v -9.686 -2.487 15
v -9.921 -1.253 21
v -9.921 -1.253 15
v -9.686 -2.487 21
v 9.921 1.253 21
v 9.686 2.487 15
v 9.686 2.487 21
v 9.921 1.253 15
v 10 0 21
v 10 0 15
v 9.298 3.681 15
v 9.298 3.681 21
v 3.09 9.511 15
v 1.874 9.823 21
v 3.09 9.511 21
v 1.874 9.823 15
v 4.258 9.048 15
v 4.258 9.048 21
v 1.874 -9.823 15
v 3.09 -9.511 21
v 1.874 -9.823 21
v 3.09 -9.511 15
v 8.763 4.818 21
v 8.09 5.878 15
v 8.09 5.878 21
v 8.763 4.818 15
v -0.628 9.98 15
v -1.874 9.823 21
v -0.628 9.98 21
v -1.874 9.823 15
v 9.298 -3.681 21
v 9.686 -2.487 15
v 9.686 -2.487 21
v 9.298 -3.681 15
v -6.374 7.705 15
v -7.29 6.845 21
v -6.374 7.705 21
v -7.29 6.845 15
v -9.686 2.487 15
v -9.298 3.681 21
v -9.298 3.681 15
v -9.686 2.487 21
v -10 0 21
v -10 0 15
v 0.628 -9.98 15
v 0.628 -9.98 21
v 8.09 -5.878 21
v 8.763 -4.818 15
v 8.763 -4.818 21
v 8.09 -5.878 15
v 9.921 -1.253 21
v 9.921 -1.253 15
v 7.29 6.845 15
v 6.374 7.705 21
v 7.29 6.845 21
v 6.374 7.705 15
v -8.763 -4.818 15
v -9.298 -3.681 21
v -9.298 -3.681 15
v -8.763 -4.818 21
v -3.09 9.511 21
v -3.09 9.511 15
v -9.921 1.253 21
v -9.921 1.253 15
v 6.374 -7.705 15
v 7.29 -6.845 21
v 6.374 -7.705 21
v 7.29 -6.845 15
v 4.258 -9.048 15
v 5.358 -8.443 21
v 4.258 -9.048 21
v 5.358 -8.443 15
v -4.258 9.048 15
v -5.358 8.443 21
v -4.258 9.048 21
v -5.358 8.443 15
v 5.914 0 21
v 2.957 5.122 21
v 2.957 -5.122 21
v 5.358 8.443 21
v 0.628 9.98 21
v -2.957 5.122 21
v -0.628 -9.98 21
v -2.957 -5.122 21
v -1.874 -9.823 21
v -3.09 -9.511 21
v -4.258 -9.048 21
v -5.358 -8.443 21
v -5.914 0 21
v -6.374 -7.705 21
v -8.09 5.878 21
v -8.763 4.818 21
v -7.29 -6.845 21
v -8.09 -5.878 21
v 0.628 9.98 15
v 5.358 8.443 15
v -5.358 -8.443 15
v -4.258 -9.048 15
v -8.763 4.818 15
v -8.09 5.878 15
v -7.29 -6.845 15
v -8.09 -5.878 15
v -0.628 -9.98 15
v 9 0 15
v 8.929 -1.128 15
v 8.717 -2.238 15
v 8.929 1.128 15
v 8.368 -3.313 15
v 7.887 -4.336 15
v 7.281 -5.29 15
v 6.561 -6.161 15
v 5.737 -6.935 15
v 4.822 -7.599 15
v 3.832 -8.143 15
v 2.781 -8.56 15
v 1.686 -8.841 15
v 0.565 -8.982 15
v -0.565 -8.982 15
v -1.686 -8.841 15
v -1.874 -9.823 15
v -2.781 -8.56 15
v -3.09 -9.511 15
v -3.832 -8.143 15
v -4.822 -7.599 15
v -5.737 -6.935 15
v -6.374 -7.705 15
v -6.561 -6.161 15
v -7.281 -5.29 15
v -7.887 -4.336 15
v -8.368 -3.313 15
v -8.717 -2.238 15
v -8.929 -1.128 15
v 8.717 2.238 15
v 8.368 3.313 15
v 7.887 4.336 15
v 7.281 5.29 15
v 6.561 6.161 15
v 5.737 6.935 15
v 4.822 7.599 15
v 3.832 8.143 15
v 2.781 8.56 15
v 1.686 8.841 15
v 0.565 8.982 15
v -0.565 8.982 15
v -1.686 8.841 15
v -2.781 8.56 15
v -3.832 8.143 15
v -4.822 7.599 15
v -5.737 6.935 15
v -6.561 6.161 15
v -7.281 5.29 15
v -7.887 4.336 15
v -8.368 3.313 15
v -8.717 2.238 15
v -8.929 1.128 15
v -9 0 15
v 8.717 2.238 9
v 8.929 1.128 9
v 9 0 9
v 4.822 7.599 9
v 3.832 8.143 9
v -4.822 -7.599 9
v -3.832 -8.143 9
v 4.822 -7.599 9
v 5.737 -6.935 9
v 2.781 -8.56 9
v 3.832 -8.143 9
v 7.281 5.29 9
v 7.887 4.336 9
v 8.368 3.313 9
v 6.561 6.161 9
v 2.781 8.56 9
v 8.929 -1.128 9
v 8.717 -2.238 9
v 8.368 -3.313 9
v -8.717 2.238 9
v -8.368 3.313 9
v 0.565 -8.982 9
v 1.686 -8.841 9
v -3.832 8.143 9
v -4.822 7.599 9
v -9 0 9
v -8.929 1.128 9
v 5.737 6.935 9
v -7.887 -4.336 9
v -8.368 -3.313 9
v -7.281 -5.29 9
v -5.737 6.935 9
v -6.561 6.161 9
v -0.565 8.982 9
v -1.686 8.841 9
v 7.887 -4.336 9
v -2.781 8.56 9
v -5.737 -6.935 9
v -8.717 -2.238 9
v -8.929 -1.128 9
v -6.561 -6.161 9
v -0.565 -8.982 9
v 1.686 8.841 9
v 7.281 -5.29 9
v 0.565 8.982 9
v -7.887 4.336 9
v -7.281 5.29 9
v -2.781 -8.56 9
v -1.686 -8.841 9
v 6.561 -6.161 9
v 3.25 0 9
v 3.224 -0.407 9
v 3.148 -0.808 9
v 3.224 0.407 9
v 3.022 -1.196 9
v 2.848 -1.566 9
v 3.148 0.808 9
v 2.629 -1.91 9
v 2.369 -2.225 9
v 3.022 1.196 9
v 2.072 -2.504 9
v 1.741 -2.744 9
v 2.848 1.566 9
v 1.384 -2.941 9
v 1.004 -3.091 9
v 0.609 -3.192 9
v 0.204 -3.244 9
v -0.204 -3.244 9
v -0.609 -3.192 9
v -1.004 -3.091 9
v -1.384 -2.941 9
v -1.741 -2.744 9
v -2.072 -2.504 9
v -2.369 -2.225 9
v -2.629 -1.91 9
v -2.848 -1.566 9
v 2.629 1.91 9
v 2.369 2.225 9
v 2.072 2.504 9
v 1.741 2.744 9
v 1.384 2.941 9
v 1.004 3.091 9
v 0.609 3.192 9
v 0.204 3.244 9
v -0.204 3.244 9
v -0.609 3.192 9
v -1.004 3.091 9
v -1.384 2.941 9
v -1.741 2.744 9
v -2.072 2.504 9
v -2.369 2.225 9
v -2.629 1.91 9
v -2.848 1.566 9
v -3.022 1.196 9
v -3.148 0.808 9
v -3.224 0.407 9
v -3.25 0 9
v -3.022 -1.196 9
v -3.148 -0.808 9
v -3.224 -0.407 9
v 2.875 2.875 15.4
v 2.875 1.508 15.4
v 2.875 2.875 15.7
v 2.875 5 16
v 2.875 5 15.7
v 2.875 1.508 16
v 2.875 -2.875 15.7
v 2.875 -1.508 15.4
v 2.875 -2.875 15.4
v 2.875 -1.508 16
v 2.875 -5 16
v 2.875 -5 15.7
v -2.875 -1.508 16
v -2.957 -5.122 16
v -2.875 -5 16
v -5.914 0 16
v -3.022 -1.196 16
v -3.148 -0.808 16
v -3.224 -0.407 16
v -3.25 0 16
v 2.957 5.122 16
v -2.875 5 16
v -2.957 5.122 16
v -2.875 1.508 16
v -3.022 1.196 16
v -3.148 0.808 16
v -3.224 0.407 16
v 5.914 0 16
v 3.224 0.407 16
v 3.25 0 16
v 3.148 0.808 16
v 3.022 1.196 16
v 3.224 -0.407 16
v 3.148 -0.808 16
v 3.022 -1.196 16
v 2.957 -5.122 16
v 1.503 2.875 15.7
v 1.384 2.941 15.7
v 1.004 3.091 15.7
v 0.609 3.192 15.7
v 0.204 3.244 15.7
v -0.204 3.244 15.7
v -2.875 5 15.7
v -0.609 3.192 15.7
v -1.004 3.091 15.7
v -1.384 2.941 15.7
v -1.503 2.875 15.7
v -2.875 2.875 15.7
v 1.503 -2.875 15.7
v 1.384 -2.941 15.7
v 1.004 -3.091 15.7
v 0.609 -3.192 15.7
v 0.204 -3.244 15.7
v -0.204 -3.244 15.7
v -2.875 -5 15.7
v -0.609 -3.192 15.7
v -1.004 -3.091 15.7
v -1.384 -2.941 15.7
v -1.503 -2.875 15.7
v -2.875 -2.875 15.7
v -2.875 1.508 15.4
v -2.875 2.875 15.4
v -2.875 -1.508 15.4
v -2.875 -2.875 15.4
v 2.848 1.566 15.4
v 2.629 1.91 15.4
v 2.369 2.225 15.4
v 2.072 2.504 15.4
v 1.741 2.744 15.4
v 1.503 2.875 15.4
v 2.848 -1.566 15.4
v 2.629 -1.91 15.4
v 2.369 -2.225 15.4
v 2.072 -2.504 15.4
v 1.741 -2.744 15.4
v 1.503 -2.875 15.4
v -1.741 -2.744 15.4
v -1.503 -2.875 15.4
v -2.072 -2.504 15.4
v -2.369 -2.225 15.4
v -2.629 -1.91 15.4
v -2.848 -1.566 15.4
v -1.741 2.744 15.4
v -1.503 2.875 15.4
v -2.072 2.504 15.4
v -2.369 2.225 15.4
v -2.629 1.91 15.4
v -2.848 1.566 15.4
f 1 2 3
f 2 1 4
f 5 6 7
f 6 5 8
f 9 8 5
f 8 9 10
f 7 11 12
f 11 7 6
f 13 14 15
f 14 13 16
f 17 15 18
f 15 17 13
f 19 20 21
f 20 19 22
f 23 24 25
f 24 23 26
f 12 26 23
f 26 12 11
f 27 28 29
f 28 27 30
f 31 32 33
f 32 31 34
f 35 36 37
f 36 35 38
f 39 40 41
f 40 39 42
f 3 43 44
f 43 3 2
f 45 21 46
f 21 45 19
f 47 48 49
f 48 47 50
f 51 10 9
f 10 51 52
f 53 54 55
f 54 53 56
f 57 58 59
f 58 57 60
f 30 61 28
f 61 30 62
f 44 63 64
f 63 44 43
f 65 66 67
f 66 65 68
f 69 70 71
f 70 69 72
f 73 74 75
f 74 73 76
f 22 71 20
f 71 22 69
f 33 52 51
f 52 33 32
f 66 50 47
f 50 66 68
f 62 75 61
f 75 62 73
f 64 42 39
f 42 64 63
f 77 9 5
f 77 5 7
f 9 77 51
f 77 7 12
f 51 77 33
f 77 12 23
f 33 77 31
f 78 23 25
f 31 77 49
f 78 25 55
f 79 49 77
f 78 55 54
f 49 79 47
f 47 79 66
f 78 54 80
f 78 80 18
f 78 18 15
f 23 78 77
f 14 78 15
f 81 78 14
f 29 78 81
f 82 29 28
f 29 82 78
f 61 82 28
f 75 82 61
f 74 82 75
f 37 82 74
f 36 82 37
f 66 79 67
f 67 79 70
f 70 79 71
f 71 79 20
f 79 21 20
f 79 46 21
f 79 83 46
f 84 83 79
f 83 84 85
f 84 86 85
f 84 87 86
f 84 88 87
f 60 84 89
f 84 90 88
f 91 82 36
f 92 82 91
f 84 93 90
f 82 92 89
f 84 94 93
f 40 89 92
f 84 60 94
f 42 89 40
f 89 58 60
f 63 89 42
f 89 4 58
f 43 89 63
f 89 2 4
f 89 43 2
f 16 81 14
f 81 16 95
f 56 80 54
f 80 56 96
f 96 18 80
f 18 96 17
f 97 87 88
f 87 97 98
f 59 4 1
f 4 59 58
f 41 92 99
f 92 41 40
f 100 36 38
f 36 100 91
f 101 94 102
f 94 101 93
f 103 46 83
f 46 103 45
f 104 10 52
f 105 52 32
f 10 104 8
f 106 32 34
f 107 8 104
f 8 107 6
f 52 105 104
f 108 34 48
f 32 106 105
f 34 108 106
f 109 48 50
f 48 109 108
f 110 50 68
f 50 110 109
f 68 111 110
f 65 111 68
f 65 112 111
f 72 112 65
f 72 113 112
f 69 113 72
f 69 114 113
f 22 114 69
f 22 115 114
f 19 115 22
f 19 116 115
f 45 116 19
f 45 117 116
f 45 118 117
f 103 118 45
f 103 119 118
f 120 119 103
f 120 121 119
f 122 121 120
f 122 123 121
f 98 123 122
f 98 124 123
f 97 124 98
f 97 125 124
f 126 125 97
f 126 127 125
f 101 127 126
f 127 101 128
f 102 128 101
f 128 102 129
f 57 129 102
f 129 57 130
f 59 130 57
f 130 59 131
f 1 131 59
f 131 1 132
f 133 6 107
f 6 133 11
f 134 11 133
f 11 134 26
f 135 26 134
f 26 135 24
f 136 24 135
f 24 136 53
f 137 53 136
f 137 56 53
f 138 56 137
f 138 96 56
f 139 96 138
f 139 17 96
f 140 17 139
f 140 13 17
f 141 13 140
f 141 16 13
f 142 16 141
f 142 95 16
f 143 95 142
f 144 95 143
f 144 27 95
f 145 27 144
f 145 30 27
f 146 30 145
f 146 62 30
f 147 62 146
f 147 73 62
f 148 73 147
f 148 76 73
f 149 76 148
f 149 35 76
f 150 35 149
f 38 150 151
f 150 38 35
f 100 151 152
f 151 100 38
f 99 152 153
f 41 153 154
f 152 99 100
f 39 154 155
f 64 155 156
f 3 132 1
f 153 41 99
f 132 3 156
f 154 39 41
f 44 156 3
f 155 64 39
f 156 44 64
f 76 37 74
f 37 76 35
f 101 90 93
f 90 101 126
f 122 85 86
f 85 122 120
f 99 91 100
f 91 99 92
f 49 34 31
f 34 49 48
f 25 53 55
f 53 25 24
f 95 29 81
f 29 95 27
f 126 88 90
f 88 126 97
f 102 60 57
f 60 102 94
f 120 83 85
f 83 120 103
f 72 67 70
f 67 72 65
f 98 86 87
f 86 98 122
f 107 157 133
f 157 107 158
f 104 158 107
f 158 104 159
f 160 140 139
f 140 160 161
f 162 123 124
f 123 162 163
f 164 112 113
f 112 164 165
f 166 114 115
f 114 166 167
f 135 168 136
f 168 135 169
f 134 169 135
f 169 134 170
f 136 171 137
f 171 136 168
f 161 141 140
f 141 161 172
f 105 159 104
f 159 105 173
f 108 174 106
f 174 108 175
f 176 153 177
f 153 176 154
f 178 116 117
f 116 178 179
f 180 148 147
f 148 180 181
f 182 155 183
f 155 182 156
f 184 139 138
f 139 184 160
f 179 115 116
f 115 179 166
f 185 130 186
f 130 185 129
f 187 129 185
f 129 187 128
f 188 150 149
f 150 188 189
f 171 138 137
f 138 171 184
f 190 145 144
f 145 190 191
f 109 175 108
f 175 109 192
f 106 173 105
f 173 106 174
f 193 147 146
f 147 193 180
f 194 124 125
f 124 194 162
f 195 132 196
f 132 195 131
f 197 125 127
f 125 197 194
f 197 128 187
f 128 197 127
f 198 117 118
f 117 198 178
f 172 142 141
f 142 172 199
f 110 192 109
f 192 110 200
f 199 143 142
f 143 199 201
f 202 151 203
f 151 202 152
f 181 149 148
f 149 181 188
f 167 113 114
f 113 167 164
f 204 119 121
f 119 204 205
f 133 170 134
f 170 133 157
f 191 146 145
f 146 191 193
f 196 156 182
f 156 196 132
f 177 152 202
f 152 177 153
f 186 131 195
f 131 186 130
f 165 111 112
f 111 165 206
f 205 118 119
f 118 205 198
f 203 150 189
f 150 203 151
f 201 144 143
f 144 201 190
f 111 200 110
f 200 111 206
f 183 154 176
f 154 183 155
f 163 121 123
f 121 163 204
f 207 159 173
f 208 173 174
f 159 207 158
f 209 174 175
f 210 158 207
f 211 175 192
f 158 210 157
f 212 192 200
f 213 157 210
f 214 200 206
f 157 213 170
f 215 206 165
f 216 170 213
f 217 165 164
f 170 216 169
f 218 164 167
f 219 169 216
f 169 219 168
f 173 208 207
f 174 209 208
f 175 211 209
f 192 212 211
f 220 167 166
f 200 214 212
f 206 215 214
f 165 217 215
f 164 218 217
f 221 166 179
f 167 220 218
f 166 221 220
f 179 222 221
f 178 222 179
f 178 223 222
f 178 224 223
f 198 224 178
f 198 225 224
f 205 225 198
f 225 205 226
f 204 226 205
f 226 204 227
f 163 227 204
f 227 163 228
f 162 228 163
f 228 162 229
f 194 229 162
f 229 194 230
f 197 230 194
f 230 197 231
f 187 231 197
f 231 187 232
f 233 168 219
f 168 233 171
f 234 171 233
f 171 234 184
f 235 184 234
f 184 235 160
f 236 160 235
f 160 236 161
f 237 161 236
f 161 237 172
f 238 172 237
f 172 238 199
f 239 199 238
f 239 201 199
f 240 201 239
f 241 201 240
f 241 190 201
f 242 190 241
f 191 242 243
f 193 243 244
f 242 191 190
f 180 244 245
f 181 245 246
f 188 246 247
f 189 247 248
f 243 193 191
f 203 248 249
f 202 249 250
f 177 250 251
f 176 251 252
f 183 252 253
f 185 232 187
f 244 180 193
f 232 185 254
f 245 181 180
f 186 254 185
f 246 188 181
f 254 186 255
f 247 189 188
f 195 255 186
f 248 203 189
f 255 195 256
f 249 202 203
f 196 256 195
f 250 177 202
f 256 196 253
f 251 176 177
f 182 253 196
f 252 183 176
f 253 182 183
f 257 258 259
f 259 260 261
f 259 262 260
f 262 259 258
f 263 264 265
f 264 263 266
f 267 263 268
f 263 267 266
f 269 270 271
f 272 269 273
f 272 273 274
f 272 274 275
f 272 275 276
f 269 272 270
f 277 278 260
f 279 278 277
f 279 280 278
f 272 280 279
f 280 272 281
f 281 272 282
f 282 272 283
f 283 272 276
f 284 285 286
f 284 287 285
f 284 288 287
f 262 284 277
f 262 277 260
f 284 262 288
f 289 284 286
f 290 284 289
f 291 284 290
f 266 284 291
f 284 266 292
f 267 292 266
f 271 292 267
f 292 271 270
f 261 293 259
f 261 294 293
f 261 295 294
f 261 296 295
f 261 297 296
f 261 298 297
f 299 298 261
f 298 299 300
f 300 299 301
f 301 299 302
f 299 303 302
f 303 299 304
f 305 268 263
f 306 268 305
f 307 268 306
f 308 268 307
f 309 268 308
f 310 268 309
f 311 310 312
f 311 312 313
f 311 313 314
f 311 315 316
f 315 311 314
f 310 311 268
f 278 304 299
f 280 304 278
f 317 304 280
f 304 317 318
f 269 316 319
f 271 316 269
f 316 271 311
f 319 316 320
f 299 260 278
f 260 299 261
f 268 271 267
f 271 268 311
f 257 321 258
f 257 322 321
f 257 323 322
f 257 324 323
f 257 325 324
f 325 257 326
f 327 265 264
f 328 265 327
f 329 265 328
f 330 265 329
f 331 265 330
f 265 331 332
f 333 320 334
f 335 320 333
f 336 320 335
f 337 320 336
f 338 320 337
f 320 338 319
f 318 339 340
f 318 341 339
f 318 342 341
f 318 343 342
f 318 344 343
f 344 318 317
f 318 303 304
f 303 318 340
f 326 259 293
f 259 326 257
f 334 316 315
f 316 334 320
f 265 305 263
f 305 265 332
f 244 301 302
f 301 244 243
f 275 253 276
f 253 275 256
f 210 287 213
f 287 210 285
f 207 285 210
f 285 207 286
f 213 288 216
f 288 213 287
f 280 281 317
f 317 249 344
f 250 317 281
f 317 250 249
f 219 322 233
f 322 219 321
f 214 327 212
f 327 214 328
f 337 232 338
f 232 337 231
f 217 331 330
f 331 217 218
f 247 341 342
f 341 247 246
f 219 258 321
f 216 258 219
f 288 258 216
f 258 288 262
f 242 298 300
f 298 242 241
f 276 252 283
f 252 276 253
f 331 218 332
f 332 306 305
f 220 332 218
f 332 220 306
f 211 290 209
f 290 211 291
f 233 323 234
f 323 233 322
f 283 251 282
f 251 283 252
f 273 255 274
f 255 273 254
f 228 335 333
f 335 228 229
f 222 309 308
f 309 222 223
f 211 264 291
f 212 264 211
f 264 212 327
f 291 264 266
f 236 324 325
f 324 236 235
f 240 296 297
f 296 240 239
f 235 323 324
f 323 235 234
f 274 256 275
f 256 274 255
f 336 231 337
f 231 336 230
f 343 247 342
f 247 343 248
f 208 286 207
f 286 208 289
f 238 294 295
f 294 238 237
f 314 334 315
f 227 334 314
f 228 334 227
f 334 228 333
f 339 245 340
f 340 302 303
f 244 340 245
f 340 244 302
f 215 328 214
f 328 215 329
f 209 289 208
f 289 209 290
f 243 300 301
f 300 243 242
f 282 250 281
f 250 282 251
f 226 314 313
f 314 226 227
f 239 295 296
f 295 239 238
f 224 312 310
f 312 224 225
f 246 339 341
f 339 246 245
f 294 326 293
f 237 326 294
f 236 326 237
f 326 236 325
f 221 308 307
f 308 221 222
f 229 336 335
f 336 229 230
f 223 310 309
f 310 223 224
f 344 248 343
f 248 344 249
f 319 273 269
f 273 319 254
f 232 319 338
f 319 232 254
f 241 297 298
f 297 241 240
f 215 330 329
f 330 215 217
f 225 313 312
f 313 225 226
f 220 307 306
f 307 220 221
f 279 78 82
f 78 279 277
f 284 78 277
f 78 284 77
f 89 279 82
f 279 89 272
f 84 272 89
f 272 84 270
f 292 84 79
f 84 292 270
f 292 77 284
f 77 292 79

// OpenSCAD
$fn = 50;


difference() {
	union() {
		translate(v = [0, 0, 15.0000000000]) {
			cylinder(h = 6, r = 10.0000000000);
		}
		translate(v = [0, 0, 9.0000000000]) {
			cylinder(h = 12, r = 9.0000000000);
		}
	}
	union() {
		translate(v = [0, 0, 21]) {
			rotate(a = [0, 0, 0]) {
				difference() {
					union() {
						#translate(v = [-2.8750000000, -5.0000000000, -5.3000000000]) {
							cube(size = [5.7500000000, 10, 0.3000000000]);
						}
						#translate(v = [-2.8750000000, -2.8750000000, -5.6000000000]) {
							cube(size = [5.7500000000, 5.7500000000, 0.3000000000]);
						}
						#translate(v = [-2.8750000000, -5.0000000000, 0]) {
							cube(size = [5.7500000000, 10, 0.3000000000]);
						}
						#translate(v = [-2.8750000000, -2.8750000000, 0.3000000000]) {
							cube(size = [5.7500000000, 5.7500000000, 0.3000000000]);
						}
						#translate(v = [0, 0, -100.0000000000]) {
							cylinder(h = 200, r = 3.2500000000);
						}
						translate(v = [0, 0, -5]) {
							#linear_extrude(height = 5) {
								polygon(points = [[5.9142500000, 0.0000000000], [2.9571250000, 5.1218907443], [-2.9571250000, 5.1218907443], [-5.9142500000, 0.0000000000], [-2.9571250000, -5.1218907443], [2.9571250000, -5.1218907443]]);
							}
						}
						#translate(v = [-2.8750000000, -5.0000000000, -5.3000000000]) {
							cube(size = [5.7500000000, 10, 0.3000000000]);
						}
						#translate(v = [-2.8750000000, -2.8750000000, -5.6000000000]) {
							cube(size = [5.7500000000, 5.7500000000, 0.3000000000]);
						}
						#translate(v = [-2.8750000000, -5.0000000000, 0]) {
							cube(size = [5.7500000000, 10, 0.3000000000]);
						}
						#translate(v = [-2.8750000000, -2.8750000000, 0.3000000000]) {
							cube(size = [5.7500000000, 5.7500000000, 0.3000000000]);
						}
						#translate(v = [0, 0, -100.0000000000]) {
							cylinder(h = 200, r = 3.2500000000);
						}
						#translate(v = [-2.8750000000, -5.0000000000, -5.3000000000]) {
							cube(size = [5.7500000000, 10, 0.3000000000]);
						}
						#translate(v = [-2.8750000000, -2.8750000000, -5.6000000000]) {
							cube(size = [5.7500000000, 5.7500000000, 0.3000000000]);
						}
						#translate(v = [-2.8750000000, -5.0000000000, 0]) {
							cube(size = [5.7500000000, 10, 0.3000000000]);
						}
						#translate(v = [-2.8750000000, -2.8750000000, 0.3000000000]) {
							cube(size = [5.7500000000, 5.7500000000, 0.3000000000]);
						}
						#translate(v = [0, 0, -100.0000000000]) {
							cylinder(h = 200, r = 3.2500000000);
						}
					}
					union();
				}
			}
		}
		#translate(v = [0, 0, -100.0000000000]) {
			cylinder(h = 200, r = 3.2500000000);
		}
	}
}
